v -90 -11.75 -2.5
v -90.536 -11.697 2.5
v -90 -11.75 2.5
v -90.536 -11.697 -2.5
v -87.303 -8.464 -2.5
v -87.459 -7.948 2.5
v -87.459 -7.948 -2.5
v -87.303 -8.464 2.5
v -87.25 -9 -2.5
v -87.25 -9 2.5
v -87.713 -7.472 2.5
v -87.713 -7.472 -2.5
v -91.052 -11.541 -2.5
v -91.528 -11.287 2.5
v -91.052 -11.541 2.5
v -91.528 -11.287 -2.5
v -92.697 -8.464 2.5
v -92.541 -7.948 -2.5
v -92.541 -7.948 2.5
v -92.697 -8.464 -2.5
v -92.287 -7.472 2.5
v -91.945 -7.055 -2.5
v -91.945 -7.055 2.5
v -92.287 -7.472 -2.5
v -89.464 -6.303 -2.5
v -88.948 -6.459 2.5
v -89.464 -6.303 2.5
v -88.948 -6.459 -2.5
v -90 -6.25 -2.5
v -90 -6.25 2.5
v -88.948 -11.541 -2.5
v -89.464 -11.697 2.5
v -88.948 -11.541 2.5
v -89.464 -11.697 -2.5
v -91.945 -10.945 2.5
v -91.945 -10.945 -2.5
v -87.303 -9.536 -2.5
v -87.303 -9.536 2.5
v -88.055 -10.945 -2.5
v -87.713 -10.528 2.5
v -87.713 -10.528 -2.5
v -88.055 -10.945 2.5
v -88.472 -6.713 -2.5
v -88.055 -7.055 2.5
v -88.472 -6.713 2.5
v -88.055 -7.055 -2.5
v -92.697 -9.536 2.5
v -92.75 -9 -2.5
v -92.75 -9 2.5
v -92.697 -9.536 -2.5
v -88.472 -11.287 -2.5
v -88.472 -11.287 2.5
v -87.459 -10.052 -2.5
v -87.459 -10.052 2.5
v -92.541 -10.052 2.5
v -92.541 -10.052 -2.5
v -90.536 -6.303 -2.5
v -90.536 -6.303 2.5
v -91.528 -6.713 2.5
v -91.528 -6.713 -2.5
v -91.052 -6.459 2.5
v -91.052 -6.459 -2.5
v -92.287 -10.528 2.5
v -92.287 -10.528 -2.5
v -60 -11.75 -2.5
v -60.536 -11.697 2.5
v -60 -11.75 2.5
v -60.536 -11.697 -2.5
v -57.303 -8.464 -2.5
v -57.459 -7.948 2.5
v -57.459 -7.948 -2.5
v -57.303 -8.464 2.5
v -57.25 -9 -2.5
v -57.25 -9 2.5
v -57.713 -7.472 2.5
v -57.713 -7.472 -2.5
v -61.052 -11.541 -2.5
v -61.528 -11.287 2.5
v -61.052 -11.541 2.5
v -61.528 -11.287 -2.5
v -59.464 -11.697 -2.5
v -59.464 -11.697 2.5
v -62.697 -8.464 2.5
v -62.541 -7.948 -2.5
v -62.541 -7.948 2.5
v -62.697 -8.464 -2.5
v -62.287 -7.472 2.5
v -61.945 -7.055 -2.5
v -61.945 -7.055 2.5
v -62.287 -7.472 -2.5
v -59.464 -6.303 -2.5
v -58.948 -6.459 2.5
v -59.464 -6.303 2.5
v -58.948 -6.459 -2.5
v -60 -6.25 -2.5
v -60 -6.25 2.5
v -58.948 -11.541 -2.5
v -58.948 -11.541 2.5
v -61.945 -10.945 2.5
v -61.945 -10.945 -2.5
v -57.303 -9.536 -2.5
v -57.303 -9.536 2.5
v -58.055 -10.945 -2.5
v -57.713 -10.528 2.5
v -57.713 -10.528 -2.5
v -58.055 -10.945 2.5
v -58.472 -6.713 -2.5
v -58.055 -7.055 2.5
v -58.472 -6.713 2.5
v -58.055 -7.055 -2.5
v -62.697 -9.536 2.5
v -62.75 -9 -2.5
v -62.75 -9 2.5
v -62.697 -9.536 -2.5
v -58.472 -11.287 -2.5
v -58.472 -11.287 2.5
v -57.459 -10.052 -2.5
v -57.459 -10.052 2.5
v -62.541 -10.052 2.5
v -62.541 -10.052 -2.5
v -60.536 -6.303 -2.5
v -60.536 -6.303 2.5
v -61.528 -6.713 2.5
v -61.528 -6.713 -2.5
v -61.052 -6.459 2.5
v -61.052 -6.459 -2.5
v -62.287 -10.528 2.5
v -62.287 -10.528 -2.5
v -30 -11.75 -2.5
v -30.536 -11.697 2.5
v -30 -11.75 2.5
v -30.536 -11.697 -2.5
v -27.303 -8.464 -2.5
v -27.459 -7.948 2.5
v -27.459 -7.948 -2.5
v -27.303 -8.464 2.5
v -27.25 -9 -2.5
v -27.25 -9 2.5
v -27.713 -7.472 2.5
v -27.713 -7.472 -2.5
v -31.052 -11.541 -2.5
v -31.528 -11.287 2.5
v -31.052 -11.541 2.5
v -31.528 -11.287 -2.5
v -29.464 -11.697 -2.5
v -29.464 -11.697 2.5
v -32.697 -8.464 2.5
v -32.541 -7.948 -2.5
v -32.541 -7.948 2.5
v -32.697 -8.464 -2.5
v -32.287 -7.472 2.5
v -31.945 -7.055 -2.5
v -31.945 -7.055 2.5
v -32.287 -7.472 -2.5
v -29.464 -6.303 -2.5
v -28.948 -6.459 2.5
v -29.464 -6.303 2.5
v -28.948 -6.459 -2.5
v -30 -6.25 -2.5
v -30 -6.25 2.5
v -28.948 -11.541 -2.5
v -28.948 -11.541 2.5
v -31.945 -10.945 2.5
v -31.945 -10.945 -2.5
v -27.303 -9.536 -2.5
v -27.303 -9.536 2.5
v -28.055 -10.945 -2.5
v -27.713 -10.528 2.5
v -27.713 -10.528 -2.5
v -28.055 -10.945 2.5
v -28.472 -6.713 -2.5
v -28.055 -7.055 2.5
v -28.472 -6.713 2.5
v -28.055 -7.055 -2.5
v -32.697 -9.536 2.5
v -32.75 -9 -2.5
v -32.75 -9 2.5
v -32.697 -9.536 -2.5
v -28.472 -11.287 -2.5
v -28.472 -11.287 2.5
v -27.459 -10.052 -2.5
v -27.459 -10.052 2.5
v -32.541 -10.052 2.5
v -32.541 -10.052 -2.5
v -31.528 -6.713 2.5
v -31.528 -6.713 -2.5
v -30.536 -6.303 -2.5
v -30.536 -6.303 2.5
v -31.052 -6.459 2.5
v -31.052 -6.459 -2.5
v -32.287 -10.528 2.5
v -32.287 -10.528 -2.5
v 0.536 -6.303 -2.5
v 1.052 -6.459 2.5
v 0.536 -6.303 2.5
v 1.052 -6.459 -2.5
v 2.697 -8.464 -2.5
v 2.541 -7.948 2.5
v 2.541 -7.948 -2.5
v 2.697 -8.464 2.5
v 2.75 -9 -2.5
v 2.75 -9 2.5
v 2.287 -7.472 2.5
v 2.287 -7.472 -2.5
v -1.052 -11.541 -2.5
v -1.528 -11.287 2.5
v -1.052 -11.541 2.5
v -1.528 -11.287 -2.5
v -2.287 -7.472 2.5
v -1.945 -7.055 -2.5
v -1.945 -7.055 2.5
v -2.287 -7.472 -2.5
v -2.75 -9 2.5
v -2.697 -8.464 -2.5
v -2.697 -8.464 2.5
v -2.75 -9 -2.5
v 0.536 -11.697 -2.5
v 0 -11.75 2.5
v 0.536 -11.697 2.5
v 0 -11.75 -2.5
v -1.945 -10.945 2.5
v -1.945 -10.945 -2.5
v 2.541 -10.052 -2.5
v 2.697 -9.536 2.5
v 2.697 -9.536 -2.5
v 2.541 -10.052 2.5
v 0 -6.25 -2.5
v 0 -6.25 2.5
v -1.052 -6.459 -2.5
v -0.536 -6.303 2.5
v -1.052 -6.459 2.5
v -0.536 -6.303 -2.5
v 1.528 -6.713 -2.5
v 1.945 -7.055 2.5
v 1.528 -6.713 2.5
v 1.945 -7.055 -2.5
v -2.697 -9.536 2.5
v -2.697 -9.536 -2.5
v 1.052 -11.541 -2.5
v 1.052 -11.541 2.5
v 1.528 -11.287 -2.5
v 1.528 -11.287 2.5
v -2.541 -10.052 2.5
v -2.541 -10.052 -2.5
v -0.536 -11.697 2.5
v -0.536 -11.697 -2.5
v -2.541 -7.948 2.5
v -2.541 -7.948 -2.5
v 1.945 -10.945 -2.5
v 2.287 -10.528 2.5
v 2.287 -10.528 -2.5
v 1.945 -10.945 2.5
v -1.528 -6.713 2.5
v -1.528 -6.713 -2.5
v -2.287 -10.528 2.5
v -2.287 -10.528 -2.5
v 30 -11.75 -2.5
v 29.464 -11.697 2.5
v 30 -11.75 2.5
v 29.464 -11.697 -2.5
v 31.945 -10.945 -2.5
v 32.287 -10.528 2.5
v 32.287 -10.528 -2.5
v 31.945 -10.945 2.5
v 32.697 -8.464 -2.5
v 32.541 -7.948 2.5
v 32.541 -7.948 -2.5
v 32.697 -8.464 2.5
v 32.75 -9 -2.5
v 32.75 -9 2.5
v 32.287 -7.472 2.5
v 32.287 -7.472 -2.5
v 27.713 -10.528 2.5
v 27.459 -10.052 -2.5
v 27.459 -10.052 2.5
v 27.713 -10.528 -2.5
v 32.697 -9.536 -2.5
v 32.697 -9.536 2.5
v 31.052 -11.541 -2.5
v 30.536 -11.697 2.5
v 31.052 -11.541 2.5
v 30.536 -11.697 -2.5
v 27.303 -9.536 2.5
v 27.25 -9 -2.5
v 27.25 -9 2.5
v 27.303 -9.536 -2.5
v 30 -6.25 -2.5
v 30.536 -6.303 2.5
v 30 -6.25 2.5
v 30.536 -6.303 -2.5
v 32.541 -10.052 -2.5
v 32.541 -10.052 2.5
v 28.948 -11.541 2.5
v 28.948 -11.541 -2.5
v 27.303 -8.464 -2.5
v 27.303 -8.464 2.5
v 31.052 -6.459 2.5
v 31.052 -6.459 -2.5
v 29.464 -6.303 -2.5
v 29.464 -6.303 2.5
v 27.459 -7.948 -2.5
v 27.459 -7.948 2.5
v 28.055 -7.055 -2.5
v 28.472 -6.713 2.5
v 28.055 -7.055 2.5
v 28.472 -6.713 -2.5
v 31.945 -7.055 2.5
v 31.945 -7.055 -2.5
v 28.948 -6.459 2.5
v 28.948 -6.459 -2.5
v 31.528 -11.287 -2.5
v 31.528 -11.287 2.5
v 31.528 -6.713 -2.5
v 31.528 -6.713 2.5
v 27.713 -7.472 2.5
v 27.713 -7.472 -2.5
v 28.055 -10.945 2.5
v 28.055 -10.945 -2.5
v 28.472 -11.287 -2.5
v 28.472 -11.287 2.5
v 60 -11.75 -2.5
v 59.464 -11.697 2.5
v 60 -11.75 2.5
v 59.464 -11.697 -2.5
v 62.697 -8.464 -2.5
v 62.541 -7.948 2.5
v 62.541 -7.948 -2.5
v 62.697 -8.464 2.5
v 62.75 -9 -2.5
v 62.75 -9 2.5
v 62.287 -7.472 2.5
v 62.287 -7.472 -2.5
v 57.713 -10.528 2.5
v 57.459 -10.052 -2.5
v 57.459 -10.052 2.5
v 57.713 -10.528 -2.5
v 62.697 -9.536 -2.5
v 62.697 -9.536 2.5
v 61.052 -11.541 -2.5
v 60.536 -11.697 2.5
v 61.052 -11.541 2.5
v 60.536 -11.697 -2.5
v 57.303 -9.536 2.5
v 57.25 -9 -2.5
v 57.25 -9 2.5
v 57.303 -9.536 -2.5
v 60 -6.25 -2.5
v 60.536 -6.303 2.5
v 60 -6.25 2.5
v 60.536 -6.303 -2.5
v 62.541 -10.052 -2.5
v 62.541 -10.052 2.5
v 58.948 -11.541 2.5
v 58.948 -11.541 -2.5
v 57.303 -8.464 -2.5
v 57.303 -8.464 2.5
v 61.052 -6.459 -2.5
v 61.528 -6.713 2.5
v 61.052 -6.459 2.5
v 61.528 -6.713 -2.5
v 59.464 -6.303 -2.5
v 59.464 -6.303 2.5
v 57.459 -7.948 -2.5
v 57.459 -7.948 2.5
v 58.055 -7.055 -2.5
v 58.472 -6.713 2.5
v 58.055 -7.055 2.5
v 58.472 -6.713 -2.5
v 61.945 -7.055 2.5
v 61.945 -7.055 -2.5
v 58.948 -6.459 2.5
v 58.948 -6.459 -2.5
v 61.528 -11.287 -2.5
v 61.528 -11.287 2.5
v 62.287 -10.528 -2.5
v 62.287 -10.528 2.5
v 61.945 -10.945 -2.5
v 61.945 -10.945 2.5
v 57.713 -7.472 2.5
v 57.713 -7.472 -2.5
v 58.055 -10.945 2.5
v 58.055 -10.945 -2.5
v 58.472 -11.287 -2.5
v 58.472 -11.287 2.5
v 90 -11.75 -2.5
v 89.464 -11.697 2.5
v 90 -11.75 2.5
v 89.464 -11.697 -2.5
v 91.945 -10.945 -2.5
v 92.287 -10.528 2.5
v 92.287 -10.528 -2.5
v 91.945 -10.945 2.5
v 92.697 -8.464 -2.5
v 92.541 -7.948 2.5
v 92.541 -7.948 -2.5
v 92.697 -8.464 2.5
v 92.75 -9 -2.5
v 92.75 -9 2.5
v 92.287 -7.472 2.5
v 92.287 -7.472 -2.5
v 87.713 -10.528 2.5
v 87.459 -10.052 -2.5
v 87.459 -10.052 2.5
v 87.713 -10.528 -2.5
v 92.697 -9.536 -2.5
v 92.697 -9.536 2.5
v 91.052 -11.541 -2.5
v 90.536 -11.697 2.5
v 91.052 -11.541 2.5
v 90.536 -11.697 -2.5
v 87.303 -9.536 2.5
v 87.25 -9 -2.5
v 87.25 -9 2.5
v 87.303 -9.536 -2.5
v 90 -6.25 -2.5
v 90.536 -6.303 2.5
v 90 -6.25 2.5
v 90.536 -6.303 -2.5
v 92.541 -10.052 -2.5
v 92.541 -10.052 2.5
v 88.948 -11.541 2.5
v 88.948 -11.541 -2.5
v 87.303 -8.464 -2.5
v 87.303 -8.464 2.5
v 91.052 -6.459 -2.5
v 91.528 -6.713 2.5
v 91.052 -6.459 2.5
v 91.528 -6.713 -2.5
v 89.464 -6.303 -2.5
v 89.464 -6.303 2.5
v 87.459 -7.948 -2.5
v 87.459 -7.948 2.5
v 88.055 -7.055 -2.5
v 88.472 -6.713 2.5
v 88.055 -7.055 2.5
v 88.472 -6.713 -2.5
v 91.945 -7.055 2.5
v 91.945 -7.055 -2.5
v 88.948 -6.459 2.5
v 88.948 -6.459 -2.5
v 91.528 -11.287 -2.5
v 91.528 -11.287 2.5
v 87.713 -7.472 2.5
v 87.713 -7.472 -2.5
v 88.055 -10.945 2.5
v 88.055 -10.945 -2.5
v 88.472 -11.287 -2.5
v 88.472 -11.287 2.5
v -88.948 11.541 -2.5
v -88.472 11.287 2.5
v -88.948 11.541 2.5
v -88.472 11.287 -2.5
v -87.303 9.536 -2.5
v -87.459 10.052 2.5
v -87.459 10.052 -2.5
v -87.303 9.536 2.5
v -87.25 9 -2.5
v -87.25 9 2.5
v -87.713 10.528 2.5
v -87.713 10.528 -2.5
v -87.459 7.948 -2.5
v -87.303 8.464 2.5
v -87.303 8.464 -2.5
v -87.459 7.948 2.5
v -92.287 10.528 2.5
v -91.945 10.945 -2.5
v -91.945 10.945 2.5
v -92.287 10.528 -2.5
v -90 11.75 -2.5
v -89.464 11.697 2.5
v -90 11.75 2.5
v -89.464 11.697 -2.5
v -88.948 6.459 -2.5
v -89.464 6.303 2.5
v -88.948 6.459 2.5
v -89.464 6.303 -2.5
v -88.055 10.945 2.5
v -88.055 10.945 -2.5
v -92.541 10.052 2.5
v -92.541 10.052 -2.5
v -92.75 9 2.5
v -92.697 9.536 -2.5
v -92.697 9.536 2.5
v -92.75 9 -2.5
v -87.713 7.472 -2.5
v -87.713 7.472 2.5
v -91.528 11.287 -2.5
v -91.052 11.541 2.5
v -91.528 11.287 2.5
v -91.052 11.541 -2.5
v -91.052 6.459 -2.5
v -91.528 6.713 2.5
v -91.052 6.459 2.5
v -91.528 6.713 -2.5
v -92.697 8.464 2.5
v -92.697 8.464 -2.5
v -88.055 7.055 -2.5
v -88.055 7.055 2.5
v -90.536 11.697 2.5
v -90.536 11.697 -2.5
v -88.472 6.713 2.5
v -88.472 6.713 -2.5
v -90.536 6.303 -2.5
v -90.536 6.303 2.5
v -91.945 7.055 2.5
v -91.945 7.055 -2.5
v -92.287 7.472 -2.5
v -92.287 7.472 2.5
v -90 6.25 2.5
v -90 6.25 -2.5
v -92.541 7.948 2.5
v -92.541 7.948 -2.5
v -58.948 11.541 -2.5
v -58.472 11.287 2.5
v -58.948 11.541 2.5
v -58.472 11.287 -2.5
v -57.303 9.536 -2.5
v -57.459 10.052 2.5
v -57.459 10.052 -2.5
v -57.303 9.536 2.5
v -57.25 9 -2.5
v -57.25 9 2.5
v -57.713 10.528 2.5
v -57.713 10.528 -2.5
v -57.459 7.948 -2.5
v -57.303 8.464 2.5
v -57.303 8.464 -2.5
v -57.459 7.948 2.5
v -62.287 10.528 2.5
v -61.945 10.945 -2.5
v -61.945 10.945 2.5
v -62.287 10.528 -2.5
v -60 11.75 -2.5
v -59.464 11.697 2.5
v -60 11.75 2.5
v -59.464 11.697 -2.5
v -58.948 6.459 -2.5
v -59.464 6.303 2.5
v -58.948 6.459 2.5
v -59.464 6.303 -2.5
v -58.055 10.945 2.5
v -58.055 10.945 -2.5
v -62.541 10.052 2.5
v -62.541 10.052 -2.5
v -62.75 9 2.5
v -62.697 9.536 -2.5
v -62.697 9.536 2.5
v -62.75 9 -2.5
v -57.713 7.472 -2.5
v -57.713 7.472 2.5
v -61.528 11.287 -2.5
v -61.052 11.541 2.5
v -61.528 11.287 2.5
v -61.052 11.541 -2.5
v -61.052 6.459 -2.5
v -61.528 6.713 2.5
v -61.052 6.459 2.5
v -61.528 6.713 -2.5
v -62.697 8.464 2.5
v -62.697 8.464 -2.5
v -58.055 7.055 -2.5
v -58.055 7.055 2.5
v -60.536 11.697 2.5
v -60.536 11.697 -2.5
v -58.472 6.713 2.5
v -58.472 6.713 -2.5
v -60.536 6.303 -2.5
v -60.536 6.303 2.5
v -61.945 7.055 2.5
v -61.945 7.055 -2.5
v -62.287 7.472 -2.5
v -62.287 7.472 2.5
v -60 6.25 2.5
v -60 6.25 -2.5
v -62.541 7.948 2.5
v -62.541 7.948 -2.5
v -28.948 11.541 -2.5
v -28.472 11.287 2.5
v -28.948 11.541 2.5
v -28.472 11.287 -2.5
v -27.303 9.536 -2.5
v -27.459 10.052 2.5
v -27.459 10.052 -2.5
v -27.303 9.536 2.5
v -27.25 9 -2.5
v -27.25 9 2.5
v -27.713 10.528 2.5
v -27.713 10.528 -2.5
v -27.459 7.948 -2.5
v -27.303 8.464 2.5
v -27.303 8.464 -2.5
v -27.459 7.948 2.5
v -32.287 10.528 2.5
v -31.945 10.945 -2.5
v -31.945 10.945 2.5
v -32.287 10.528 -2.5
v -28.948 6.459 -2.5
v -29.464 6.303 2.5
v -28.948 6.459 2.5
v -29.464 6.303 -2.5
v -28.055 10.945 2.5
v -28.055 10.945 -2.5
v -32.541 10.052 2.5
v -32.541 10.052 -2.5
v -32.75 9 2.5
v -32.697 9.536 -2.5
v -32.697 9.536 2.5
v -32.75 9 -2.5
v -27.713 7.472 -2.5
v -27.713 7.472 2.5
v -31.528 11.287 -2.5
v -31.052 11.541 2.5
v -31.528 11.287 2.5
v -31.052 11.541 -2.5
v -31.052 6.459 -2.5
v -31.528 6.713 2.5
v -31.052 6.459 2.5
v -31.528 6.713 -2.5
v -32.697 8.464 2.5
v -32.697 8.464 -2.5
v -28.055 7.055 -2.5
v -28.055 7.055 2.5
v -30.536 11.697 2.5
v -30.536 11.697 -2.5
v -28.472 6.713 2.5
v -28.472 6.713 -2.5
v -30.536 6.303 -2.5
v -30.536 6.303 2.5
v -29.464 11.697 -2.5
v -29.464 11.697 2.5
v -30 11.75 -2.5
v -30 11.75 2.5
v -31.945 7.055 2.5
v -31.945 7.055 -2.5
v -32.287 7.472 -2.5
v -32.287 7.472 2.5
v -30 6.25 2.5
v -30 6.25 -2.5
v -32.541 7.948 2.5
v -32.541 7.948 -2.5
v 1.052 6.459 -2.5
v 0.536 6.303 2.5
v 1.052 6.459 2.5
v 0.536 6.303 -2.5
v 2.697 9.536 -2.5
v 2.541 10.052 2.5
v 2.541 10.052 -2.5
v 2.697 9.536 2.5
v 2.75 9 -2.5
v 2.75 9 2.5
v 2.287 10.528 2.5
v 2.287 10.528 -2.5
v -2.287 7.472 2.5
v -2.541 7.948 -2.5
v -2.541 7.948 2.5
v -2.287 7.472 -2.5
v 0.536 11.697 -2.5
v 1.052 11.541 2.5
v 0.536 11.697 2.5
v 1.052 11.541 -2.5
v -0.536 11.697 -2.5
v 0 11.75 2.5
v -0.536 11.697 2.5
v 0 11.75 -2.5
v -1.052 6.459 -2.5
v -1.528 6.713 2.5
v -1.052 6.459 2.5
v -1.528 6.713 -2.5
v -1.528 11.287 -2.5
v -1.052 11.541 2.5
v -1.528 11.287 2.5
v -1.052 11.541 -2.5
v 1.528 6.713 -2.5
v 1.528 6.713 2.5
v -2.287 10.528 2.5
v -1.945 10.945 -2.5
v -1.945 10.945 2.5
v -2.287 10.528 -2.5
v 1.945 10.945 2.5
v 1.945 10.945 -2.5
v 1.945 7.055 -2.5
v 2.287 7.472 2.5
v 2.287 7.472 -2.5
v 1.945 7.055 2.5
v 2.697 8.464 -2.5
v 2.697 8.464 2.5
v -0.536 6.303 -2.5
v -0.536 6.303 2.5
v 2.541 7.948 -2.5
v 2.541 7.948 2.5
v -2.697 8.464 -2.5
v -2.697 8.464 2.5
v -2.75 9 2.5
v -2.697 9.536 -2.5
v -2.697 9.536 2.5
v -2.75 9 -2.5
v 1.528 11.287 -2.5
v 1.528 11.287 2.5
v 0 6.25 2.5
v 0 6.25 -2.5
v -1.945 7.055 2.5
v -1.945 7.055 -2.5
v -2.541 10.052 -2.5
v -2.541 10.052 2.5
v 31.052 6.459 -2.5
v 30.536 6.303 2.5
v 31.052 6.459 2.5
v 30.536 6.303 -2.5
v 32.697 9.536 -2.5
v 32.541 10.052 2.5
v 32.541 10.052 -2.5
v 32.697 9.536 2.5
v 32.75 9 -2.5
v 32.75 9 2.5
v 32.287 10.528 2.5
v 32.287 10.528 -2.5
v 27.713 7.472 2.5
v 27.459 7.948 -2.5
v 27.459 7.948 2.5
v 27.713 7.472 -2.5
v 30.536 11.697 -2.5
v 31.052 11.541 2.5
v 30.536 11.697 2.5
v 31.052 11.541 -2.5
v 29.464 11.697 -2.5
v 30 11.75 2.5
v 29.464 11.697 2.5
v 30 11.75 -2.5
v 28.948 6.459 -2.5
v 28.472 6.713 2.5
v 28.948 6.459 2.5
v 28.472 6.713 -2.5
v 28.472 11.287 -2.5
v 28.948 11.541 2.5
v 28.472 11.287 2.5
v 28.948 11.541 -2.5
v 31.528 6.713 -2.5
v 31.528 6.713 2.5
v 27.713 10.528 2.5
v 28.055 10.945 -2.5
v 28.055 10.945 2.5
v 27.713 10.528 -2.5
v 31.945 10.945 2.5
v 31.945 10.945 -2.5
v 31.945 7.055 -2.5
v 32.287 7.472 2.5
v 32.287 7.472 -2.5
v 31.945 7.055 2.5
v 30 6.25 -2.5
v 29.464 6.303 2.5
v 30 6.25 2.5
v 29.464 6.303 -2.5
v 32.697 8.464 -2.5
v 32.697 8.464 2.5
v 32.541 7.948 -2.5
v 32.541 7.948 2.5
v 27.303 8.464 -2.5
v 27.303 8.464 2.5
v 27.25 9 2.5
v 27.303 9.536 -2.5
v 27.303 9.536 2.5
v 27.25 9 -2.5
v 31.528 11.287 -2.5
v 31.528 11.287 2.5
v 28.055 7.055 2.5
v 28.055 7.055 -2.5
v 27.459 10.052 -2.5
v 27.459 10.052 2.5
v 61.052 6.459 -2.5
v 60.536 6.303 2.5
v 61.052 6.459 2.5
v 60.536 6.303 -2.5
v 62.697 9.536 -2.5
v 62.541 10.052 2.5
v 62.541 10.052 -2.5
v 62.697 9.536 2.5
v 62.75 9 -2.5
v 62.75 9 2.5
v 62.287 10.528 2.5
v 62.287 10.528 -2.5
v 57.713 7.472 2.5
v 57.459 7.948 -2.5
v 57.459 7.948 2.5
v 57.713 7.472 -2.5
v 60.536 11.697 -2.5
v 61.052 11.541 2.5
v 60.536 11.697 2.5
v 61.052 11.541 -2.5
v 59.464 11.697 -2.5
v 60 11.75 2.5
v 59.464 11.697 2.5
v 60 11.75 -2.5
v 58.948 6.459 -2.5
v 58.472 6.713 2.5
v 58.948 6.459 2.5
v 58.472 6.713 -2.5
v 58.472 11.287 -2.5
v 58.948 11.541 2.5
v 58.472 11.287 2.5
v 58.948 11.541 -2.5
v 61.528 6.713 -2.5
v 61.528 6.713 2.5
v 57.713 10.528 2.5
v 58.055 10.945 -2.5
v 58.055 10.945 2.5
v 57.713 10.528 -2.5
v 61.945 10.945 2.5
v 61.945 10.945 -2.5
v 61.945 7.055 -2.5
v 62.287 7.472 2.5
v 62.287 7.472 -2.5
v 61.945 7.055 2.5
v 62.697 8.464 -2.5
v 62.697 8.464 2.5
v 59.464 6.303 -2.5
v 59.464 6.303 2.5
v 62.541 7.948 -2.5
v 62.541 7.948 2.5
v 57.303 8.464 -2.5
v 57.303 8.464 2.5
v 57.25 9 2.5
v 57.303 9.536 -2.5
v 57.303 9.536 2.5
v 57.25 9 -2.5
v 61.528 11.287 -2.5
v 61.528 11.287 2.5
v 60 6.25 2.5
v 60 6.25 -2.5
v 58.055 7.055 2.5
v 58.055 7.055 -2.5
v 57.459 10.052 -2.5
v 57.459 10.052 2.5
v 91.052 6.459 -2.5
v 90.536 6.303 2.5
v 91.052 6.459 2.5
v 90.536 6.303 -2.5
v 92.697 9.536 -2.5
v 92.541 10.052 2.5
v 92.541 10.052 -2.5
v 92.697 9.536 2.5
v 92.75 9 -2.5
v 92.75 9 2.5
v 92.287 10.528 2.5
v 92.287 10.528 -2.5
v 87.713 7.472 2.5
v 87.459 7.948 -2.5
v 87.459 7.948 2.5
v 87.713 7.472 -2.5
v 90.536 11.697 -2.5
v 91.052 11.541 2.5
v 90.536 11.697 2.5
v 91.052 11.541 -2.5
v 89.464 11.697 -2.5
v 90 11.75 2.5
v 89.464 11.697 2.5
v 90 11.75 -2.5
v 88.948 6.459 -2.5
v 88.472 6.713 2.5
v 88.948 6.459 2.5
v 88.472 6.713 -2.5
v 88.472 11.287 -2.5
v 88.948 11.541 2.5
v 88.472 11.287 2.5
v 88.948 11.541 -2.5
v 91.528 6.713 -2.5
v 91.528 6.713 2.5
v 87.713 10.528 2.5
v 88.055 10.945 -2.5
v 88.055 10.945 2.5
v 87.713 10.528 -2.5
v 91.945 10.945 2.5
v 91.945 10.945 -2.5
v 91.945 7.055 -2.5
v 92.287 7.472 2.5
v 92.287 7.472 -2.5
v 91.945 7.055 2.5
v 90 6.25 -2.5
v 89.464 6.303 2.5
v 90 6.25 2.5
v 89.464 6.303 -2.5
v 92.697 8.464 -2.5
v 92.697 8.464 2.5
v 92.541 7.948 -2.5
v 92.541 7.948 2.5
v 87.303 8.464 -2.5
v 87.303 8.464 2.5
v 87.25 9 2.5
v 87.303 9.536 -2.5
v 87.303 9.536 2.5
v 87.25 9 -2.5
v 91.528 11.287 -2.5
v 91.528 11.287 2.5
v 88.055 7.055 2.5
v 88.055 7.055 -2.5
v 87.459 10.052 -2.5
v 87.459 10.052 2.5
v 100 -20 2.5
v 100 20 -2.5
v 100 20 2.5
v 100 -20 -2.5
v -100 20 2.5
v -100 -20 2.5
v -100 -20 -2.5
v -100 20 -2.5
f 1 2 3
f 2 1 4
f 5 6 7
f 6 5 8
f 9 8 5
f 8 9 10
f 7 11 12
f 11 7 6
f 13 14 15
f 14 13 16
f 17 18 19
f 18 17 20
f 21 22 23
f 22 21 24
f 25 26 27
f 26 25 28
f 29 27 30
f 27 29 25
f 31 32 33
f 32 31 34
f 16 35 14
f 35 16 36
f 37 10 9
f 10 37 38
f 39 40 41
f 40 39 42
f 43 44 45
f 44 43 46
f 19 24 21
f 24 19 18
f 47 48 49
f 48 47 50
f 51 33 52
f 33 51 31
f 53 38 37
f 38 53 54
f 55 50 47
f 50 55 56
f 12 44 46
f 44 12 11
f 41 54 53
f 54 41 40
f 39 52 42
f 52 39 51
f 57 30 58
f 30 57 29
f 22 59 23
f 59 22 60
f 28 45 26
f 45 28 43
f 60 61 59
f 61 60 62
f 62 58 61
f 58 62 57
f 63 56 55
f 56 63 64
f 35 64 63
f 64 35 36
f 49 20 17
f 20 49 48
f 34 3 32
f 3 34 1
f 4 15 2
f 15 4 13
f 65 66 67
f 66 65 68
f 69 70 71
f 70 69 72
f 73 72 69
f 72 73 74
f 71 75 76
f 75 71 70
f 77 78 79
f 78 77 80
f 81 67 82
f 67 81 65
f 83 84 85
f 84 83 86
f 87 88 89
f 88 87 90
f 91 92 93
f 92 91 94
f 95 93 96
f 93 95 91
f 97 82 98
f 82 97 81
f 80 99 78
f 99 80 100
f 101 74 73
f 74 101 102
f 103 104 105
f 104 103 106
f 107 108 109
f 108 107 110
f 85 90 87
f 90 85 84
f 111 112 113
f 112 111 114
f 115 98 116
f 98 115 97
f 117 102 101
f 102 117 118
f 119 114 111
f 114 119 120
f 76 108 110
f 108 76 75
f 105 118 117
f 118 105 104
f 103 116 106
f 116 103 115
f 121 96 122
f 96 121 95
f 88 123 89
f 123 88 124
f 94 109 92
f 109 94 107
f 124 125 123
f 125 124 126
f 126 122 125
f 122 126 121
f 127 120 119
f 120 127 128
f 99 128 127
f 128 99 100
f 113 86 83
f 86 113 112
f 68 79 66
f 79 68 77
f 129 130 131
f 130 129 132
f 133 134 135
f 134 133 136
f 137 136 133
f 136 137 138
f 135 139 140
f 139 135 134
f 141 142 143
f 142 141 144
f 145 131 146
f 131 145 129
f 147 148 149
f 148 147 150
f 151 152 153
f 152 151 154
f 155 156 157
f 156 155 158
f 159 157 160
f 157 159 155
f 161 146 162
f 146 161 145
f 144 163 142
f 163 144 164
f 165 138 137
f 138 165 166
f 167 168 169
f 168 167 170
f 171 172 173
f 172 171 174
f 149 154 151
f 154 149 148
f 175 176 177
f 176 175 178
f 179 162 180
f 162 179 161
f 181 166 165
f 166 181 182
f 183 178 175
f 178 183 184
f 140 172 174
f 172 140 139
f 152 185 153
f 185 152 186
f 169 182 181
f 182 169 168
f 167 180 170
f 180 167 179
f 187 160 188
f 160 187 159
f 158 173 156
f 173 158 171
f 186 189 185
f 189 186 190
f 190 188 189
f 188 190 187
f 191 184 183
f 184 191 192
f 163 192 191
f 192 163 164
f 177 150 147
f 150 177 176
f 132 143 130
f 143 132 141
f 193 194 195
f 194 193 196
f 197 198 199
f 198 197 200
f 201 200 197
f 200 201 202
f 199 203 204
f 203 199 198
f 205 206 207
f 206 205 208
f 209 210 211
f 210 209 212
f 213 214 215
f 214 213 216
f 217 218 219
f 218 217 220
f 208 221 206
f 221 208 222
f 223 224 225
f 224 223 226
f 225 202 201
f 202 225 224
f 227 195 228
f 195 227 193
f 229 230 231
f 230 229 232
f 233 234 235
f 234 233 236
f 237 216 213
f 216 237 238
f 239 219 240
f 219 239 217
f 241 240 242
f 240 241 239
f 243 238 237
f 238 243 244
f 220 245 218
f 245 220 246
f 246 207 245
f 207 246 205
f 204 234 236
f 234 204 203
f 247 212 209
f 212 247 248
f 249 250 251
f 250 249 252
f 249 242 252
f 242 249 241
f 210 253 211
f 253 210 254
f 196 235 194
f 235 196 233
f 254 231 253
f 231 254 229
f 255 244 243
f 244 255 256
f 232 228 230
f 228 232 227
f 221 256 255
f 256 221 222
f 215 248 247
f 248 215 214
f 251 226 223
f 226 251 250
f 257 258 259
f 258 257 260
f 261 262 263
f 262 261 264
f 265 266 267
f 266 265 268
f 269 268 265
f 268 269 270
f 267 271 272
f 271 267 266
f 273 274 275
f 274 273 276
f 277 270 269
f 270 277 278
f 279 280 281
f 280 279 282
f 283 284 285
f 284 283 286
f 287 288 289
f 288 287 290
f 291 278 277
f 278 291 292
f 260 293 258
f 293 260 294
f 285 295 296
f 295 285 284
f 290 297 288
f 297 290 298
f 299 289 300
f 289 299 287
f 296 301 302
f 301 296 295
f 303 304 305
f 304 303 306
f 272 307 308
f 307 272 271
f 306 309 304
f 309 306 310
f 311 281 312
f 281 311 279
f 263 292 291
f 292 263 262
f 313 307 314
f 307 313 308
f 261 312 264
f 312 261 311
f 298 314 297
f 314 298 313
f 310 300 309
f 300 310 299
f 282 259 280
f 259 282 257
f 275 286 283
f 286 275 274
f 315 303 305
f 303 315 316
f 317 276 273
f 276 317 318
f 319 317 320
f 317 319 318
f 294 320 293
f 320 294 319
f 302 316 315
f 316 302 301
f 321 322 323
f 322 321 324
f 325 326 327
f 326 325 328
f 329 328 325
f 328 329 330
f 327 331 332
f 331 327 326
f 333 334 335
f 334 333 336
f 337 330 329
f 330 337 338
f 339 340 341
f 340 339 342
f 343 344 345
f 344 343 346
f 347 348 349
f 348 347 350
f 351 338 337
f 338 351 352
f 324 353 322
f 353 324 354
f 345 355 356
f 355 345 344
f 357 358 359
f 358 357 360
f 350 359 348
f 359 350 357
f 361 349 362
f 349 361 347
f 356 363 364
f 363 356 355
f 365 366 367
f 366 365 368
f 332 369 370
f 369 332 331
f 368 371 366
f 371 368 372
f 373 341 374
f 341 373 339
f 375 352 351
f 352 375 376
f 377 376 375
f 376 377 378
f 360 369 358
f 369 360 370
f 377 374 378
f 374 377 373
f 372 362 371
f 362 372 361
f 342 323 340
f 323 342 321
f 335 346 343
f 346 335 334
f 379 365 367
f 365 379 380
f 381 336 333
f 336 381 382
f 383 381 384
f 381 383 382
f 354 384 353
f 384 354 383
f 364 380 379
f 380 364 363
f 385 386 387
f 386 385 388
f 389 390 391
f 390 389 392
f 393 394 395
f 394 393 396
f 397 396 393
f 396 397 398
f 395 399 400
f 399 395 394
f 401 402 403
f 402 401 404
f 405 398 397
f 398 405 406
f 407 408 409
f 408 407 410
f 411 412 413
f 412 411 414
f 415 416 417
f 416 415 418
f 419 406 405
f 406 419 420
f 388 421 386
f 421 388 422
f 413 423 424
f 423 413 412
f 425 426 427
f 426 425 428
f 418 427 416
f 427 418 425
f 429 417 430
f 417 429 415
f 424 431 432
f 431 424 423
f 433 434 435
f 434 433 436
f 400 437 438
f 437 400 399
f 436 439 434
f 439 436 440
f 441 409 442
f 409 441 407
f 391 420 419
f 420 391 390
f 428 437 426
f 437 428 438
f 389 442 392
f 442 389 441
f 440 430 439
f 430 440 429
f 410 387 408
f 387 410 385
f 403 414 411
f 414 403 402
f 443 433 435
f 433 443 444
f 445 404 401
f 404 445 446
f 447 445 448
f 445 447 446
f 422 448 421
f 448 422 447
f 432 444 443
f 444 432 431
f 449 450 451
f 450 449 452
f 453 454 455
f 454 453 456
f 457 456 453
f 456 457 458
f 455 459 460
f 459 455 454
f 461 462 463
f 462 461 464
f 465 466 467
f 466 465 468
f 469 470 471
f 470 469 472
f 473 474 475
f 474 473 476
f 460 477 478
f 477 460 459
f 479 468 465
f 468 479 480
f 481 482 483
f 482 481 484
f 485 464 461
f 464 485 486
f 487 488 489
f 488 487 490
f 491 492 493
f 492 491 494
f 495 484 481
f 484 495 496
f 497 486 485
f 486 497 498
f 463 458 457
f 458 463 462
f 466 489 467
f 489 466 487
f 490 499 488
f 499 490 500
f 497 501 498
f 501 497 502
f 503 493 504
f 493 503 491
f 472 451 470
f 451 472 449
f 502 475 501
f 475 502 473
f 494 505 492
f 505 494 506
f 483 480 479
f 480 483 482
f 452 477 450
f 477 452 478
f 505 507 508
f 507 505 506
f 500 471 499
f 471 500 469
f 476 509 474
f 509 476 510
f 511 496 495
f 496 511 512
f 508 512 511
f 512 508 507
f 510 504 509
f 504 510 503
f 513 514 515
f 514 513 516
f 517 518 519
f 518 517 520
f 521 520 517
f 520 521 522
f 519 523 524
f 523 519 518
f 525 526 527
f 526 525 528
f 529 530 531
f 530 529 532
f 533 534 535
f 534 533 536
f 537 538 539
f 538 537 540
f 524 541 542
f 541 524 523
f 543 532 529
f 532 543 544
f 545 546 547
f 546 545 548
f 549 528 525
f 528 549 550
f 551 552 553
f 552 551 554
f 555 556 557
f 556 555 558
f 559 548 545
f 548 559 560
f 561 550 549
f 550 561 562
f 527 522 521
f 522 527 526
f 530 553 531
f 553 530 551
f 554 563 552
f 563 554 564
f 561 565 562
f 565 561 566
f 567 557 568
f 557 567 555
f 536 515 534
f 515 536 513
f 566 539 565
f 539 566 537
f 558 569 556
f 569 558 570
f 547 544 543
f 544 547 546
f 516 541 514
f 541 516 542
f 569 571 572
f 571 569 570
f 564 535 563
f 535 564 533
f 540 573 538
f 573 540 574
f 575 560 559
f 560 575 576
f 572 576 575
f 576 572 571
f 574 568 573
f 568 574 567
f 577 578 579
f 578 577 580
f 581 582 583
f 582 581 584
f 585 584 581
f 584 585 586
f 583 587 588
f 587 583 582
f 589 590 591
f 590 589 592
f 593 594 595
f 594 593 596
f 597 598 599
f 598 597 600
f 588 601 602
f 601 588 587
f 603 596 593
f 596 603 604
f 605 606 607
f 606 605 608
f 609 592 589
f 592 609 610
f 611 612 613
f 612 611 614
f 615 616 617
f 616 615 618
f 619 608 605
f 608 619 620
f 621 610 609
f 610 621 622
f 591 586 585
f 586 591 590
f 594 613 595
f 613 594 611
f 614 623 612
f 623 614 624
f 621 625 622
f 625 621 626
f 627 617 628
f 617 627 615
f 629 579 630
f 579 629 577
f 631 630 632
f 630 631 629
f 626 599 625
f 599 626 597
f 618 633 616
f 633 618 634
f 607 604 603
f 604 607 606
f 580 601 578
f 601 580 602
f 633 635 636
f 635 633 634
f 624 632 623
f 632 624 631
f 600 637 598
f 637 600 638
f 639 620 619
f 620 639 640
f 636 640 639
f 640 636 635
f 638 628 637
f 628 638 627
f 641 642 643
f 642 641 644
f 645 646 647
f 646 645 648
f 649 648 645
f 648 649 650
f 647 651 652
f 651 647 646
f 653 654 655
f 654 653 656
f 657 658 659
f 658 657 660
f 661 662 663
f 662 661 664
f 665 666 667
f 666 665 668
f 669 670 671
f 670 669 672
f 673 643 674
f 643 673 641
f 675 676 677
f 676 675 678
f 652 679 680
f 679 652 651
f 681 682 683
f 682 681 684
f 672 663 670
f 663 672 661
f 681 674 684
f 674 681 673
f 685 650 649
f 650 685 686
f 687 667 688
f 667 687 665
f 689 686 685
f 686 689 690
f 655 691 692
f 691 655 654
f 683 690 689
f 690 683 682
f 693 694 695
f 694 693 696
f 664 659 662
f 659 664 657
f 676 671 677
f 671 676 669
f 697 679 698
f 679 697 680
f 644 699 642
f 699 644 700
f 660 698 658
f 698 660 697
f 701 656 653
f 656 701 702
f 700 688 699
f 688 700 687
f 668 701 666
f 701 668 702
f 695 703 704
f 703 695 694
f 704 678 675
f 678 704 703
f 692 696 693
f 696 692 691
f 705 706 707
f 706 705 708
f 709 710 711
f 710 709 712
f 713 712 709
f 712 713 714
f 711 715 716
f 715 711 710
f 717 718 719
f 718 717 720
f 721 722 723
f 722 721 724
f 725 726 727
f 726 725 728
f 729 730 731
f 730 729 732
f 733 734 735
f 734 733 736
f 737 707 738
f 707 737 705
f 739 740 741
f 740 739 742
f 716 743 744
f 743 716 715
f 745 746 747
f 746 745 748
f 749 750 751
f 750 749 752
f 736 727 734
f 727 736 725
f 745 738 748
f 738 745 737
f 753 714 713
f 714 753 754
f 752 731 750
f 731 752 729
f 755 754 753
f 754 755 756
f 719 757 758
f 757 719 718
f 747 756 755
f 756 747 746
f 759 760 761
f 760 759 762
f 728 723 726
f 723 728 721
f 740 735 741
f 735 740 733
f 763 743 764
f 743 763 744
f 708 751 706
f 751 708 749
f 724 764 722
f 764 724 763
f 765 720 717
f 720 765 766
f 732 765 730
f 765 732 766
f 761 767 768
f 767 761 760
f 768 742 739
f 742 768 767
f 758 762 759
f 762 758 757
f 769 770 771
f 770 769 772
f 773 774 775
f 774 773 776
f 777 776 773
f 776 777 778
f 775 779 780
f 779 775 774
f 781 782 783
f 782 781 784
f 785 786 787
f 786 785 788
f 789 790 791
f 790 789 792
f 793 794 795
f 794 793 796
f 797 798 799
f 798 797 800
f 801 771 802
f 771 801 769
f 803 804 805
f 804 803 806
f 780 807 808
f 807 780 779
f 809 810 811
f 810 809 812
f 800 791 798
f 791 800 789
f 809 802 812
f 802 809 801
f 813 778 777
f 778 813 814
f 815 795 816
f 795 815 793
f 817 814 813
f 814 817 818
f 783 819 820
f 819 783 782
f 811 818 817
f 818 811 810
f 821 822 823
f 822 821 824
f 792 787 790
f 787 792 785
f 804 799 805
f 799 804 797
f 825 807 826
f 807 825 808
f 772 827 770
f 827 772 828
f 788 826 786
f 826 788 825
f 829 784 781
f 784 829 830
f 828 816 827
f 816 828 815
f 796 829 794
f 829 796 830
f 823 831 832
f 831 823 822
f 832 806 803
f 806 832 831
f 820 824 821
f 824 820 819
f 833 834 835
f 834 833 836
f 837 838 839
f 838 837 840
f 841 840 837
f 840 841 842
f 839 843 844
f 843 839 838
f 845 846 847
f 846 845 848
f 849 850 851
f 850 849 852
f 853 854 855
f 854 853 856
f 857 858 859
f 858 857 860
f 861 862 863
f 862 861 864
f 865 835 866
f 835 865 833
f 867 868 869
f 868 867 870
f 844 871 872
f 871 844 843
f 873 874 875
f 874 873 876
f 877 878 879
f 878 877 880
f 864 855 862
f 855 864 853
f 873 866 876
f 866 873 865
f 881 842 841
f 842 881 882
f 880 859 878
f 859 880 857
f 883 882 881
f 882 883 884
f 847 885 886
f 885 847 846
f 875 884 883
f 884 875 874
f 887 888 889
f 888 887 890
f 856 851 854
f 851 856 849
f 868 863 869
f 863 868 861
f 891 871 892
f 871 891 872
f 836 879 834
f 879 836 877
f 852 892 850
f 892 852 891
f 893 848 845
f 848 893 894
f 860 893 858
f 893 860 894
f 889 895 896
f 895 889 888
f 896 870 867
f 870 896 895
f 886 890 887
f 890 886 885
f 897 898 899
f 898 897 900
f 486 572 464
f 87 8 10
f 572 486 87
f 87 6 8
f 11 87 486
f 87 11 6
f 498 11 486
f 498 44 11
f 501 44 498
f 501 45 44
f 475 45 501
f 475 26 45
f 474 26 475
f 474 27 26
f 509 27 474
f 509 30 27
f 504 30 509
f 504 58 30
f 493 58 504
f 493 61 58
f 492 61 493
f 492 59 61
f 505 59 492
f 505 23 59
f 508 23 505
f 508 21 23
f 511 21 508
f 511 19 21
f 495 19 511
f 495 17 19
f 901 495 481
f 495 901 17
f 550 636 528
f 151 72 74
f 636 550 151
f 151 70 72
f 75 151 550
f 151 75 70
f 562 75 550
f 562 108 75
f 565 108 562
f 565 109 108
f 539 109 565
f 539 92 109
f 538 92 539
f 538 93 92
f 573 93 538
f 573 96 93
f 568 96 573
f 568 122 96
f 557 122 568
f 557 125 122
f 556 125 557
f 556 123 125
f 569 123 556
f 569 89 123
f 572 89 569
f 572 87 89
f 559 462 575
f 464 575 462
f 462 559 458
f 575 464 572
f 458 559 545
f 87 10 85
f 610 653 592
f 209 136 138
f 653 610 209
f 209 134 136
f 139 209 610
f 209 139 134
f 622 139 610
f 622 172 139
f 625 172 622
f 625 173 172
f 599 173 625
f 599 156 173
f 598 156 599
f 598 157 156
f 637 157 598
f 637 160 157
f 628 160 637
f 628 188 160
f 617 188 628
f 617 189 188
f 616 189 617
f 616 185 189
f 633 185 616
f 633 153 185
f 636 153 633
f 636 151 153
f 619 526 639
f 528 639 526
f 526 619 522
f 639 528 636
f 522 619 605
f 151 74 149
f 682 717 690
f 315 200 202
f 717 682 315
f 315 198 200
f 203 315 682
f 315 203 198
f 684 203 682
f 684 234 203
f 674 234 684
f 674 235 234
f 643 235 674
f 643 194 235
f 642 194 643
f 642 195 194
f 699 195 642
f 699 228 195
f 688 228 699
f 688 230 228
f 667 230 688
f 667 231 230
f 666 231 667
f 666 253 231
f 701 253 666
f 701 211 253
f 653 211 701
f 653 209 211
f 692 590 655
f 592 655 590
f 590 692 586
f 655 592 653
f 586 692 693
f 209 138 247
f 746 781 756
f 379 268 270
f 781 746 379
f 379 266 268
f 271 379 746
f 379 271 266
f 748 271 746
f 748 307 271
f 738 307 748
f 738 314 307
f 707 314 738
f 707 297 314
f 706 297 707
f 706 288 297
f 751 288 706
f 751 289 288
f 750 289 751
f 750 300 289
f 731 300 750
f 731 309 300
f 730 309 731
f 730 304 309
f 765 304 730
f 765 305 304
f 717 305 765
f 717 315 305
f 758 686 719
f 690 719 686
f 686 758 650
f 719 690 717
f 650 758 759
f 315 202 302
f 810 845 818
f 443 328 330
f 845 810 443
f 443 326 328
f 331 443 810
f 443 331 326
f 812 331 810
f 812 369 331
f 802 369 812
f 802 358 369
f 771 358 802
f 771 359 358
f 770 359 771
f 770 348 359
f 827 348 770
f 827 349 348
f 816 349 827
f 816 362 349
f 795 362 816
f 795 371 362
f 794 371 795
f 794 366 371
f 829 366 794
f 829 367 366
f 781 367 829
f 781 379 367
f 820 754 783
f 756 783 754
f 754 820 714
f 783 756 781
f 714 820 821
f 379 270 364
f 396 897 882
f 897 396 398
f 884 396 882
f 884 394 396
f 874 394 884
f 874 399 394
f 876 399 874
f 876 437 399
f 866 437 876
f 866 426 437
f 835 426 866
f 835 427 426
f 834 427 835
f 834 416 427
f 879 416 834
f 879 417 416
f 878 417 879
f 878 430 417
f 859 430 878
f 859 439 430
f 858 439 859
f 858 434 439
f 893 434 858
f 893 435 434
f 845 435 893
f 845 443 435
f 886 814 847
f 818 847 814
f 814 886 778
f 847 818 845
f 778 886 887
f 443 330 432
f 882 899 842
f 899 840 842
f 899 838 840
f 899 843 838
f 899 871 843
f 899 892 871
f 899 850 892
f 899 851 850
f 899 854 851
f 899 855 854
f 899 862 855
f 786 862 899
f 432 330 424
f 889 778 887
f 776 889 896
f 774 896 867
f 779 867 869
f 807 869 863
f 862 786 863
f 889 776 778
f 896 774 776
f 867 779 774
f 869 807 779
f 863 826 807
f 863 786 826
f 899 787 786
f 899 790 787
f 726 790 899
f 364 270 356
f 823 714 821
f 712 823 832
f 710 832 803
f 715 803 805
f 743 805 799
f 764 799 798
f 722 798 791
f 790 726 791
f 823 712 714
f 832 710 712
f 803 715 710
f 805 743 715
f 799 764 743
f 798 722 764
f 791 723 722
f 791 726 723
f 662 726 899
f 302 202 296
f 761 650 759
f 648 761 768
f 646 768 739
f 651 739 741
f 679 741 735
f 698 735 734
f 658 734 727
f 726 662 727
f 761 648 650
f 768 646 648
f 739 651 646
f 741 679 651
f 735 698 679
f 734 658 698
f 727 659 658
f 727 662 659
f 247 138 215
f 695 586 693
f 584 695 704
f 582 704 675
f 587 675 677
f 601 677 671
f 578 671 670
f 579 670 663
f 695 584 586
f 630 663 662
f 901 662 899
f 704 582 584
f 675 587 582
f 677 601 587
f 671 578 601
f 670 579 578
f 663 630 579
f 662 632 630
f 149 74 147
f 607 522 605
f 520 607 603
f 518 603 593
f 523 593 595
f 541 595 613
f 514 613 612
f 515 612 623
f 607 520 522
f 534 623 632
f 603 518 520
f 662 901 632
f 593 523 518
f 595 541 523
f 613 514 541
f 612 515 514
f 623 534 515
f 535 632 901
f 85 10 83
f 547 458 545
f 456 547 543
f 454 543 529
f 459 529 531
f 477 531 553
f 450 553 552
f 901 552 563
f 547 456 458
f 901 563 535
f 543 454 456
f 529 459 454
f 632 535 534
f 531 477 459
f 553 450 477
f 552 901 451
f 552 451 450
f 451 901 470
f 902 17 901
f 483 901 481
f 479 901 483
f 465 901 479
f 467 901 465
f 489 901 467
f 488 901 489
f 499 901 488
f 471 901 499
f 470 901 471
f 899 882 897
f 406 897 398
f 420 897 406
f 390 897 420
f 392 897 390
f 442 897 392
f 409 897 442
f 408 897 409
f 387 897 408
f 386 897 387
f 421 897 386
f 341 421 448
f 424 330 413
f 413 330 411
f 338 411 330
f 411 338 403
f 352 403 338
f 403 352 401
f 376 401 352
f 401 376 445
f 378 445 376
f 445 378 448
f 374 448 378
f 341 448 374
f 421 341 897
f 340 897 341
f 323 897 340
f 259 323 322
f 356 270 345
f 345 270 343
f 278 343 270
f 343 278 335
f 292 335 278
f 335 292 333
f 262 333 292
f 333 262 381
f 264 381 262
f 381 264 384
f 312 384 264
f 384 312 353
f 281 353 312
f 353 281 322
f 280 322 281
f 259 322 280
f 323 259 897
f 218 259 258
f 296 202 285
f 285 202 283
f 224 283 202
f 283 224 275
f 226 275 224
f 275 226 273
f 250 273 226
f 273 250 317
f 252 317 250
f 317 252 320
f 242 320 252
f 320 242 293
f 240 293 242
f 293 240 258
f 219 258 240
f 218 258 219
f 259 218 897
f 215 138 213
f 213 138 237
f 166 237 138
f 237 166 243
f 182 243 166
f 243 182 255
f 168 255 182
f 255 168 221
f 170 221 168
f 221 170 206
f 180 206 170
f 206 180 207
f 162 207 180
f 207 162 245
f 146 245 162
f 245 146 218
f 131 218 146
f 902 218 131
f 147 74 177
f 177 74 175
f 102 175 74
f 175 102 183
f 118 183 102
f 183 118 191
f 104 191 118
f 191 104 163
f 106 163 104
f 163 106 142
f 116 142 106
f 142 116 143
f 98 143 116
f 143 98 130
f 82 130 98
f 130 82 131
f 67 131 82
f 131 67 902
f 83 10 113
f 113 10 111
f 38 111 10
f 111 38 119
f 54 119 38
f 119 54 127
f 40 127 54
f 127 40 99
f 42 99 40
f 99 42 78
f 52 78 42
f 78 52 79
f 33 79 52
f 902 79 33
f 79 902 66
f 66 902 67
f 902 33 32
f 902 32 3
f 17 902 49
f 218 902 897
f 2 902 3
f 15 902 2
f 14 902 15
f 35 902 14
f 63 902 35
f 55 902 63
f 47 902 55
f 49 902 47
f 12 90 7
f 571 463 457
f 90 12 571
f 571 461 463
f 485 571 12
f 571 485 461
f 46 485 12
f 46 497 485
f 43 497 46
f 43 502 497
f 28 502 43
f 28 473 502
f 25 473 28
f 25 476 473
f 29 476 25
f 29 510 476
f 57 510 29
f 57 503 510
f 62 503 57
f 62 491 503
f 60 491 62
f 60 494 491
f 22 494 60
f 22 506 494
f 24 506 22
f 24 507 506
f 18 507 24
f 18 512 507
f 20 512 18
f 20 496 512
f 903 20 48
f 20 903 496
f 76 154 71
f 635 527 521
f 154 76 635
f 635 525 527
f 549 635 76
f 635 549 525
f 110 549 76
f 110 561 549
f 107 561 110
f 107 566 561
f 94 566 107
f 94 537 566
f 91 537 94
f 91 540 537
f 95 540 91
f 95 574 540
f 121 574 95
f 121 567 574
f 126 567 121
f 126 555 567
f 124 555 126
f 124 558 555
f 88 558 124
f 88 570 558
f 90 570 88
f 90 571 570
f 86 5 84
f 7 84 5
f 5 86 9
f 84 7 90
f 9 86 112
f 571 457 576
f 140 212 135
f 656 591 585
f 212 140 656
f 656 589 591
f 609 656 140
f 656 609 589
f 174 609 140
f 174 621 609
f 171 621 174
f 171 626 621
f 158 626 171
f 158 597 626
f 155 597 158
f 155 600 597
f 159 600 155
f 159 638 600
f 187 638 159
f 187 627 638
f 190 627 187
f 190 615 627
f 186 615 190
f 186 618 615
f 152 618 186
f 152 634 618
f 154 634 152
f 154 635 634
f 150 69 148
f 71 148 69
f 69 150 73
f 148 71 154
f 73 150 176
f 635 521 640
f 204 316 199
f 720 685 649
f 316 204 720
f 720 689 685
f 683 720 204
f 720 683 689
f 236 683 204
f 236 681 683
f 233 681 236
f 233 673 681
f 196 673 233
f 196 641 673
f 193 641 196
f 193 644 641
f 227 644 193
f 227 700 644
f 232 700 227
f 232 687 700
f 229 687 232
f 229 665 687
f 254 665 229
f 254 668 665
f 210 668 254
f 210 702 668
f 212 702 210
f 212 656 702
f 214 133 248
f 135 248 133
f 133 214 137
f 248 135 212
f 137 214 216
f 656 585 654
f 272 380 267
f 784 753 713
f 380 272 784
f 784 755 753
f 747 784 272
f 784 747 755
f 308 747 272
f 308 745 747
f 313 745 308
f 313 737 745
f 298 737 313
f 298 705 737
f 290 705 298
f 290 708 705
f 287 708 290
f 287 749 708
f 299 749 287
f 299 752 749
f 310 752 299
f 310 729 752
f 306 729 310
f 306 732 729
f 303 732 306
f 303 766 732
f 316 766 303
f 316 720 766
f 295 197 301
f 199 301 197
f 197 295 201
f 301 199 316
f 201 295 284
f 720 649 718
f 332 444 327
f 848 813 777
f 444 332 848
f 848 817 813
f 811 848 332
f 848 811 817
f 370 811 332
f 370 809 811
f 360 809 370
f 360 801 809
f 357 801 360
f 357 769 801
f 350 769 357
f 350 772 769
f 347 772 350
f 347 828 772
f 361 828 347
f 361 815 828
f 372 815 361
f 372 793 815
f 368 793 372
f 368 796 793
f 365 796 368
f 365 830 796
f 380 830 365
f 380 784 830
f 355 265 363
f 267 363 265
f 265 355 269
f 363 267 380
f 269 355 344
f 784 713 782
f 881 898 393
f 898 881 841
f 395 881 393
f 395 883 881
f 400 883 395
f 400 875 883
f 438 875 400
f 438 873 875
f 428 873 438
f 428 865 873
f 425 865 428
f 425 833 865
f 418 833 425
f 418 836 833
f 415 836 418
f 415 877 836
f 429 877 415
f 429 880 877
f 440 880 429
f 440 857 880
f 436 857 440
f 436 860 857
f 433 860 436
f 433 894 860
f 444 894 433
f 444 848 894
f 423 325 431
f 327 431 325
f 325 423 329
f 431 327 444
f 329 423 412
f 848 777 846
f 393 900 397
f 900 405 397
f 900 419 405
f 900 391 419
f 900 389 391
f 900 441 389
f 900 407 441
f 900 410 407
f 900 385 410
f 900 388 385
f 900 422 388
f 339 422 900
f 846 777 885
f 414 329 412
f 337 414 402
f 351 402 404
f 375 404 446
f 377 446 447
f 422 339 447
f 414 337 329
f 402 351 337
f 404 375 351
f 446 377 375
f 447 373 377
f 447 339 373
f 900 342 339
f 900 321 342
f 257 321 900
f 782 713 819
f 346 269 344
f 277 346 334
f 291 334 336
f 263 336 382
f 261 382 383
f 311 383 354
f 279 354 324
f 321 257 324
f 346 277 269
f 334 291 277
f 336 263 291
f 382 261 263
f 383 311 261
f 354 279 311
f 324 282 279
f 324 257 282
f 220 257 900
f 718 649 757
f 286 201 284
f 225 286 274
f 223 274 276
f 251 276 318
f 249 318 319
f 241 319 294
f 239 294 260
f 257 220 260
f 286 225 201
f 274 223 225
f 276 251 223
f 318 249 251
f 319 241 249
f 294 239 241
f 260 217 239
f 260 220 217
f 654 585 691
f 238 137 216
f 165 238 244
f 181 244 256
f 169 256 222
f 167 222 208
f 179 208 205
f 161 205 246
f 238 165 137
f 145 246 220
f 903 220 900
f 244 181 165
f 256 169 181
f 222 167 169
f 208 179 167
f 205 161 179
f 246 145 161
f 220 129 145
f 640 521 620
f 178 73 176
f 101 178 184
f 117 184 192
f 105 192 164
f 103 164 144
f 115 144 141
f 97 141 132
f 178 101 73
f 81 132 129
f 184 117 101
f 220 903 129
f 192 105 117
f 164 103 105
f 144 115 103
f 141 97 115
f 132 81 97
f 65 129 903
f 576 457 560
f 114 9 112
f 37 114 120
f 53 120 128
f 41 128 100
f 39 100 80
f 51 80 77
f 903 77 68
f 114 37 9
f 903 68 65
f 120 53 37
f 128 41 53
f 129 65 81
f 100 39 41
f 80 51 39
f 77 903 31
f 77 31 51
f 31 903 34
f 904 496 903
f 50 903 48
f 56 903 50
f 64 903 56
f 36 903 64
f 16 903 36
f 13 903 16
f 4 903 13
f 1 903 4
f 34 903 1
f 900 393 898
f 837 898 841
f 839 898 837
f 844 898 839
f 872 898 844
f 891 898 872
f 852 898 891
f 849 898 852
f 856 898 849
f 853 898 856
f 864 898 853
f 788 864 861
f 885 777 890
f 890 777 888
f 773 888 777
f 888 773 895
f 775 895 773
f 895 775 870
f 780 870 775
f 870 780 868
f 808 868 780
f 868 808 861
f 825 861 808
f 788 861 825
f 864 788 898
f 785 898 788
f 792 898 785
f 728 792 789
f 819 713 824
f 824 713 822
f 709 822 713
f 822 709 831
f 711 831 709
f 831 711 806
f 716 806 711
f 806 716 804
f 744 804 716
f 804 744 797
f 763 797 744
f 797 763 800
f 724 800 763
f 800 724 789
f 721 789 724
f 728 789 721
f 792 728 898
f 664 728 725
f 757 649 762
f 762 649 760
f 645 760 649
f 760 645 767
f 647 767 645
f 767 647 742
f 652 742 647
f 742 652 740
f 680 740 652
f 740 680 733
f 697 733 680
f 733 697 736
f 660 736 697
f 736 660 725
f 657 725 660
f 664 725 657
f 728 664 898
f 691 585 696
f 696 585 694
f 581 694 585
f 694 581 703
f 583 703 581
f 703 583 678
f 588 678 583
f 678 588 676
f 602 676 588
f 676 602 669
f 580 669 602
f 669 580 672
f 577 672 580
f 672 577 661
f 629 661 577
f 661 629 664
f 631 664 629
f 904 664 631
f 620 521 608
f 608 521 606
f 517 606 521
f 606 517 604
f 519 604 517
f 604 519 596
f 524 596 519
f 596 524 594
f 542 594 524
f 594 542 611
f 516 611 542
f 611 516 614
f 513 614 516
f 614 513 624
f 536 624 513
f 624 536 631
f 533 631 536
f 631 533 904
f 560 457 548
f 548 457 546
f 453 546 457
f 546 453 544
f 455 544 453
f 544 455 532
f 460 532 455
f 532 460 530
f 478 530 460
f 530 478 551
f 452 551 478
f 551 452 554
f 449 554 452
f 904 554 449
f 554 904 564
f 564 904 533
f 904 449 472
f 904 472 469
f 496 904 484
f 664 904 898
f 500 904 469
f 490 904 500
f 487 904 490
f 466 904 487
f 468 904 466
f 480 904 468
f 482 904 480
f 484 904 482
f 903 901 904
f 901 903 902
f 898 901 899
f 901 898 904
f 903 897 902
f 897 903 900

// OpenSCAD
$fn = 32;

// ----------------------------------------------------------------------
// Hole bar, 7 x Ø5.5
// tworows layout, 10 mm edge offset
// ----------------------------------------------------------------------

// --- parameters (mm) ---
bar_w = 40;       // bar width (Y)
bar_t = 5;        // bar thickness (Z)
holes = 7;        // holes per row
hole_d = 5.5;     // hole diameter
edge = 10;        // offset from the bar end to the first hole
pitch = 30;       // pitch between neighbouring holes
row_offset = 18;  // distance between the two rows

// --- derived feature positions (mm) ---
span = (holes - 1) * pitch;   // = 180   distance between the end holes
bar_l = span + 2 * edge;      // = 200   overall bar length
start_x = -bar_l / 2 + edge;  // = -90   X of the first hole
feature_centers = [
  [start_x + 0 * pitch, -row_offset / 2],
  [start_x + 1 * pitch, -row_offset / 2],
  [start_x + 2 * pitch, -row_offset / 2],
  [start_x + 3 * pitch, -row_offset / 2],
  [start_x + 4 * pitch, -row_offset / 2],
  [start_x + 5 * pitch, -row_offset / 2],
  [start_x + 6 * pitch, -row_offset / 2]
];   // hole centres of the first row
row2_centers = [
  [start_x + 0 * pitch, row_offset / 2],
  [start_x + 1 * pitch, row_offset / 2],
  [start_x + 2 * pitch, row_offset / 2],
  [start_x + 3 * pitch, row_offset / 2],
  [start_x + 4 * pitch, row_offset / 2],
  [start_x + 5 * pitch, row_offset / 2],
  [start_x + 6 * pitch, row_offset / 2]
];   // hole centres of the second row

// bar with two rows of holes, both read from their own centre arrays
difference() {
  translate([-bar_l / 2, -bar_w / 2, -bar_t / 2]) cube([bar_l, bar_w, bar_t]);
  for (centre = feature_centers)
    translate([centre[0], centre[1], 0])
      cylinder(d = hole_d, h = bar_t + 2, center = true);
  for (centre = row2_centers)
    translate([centre[0], centre[1], 0])
      cylinder(d = hole_d, h = bar_t + 2, center = true);
}
